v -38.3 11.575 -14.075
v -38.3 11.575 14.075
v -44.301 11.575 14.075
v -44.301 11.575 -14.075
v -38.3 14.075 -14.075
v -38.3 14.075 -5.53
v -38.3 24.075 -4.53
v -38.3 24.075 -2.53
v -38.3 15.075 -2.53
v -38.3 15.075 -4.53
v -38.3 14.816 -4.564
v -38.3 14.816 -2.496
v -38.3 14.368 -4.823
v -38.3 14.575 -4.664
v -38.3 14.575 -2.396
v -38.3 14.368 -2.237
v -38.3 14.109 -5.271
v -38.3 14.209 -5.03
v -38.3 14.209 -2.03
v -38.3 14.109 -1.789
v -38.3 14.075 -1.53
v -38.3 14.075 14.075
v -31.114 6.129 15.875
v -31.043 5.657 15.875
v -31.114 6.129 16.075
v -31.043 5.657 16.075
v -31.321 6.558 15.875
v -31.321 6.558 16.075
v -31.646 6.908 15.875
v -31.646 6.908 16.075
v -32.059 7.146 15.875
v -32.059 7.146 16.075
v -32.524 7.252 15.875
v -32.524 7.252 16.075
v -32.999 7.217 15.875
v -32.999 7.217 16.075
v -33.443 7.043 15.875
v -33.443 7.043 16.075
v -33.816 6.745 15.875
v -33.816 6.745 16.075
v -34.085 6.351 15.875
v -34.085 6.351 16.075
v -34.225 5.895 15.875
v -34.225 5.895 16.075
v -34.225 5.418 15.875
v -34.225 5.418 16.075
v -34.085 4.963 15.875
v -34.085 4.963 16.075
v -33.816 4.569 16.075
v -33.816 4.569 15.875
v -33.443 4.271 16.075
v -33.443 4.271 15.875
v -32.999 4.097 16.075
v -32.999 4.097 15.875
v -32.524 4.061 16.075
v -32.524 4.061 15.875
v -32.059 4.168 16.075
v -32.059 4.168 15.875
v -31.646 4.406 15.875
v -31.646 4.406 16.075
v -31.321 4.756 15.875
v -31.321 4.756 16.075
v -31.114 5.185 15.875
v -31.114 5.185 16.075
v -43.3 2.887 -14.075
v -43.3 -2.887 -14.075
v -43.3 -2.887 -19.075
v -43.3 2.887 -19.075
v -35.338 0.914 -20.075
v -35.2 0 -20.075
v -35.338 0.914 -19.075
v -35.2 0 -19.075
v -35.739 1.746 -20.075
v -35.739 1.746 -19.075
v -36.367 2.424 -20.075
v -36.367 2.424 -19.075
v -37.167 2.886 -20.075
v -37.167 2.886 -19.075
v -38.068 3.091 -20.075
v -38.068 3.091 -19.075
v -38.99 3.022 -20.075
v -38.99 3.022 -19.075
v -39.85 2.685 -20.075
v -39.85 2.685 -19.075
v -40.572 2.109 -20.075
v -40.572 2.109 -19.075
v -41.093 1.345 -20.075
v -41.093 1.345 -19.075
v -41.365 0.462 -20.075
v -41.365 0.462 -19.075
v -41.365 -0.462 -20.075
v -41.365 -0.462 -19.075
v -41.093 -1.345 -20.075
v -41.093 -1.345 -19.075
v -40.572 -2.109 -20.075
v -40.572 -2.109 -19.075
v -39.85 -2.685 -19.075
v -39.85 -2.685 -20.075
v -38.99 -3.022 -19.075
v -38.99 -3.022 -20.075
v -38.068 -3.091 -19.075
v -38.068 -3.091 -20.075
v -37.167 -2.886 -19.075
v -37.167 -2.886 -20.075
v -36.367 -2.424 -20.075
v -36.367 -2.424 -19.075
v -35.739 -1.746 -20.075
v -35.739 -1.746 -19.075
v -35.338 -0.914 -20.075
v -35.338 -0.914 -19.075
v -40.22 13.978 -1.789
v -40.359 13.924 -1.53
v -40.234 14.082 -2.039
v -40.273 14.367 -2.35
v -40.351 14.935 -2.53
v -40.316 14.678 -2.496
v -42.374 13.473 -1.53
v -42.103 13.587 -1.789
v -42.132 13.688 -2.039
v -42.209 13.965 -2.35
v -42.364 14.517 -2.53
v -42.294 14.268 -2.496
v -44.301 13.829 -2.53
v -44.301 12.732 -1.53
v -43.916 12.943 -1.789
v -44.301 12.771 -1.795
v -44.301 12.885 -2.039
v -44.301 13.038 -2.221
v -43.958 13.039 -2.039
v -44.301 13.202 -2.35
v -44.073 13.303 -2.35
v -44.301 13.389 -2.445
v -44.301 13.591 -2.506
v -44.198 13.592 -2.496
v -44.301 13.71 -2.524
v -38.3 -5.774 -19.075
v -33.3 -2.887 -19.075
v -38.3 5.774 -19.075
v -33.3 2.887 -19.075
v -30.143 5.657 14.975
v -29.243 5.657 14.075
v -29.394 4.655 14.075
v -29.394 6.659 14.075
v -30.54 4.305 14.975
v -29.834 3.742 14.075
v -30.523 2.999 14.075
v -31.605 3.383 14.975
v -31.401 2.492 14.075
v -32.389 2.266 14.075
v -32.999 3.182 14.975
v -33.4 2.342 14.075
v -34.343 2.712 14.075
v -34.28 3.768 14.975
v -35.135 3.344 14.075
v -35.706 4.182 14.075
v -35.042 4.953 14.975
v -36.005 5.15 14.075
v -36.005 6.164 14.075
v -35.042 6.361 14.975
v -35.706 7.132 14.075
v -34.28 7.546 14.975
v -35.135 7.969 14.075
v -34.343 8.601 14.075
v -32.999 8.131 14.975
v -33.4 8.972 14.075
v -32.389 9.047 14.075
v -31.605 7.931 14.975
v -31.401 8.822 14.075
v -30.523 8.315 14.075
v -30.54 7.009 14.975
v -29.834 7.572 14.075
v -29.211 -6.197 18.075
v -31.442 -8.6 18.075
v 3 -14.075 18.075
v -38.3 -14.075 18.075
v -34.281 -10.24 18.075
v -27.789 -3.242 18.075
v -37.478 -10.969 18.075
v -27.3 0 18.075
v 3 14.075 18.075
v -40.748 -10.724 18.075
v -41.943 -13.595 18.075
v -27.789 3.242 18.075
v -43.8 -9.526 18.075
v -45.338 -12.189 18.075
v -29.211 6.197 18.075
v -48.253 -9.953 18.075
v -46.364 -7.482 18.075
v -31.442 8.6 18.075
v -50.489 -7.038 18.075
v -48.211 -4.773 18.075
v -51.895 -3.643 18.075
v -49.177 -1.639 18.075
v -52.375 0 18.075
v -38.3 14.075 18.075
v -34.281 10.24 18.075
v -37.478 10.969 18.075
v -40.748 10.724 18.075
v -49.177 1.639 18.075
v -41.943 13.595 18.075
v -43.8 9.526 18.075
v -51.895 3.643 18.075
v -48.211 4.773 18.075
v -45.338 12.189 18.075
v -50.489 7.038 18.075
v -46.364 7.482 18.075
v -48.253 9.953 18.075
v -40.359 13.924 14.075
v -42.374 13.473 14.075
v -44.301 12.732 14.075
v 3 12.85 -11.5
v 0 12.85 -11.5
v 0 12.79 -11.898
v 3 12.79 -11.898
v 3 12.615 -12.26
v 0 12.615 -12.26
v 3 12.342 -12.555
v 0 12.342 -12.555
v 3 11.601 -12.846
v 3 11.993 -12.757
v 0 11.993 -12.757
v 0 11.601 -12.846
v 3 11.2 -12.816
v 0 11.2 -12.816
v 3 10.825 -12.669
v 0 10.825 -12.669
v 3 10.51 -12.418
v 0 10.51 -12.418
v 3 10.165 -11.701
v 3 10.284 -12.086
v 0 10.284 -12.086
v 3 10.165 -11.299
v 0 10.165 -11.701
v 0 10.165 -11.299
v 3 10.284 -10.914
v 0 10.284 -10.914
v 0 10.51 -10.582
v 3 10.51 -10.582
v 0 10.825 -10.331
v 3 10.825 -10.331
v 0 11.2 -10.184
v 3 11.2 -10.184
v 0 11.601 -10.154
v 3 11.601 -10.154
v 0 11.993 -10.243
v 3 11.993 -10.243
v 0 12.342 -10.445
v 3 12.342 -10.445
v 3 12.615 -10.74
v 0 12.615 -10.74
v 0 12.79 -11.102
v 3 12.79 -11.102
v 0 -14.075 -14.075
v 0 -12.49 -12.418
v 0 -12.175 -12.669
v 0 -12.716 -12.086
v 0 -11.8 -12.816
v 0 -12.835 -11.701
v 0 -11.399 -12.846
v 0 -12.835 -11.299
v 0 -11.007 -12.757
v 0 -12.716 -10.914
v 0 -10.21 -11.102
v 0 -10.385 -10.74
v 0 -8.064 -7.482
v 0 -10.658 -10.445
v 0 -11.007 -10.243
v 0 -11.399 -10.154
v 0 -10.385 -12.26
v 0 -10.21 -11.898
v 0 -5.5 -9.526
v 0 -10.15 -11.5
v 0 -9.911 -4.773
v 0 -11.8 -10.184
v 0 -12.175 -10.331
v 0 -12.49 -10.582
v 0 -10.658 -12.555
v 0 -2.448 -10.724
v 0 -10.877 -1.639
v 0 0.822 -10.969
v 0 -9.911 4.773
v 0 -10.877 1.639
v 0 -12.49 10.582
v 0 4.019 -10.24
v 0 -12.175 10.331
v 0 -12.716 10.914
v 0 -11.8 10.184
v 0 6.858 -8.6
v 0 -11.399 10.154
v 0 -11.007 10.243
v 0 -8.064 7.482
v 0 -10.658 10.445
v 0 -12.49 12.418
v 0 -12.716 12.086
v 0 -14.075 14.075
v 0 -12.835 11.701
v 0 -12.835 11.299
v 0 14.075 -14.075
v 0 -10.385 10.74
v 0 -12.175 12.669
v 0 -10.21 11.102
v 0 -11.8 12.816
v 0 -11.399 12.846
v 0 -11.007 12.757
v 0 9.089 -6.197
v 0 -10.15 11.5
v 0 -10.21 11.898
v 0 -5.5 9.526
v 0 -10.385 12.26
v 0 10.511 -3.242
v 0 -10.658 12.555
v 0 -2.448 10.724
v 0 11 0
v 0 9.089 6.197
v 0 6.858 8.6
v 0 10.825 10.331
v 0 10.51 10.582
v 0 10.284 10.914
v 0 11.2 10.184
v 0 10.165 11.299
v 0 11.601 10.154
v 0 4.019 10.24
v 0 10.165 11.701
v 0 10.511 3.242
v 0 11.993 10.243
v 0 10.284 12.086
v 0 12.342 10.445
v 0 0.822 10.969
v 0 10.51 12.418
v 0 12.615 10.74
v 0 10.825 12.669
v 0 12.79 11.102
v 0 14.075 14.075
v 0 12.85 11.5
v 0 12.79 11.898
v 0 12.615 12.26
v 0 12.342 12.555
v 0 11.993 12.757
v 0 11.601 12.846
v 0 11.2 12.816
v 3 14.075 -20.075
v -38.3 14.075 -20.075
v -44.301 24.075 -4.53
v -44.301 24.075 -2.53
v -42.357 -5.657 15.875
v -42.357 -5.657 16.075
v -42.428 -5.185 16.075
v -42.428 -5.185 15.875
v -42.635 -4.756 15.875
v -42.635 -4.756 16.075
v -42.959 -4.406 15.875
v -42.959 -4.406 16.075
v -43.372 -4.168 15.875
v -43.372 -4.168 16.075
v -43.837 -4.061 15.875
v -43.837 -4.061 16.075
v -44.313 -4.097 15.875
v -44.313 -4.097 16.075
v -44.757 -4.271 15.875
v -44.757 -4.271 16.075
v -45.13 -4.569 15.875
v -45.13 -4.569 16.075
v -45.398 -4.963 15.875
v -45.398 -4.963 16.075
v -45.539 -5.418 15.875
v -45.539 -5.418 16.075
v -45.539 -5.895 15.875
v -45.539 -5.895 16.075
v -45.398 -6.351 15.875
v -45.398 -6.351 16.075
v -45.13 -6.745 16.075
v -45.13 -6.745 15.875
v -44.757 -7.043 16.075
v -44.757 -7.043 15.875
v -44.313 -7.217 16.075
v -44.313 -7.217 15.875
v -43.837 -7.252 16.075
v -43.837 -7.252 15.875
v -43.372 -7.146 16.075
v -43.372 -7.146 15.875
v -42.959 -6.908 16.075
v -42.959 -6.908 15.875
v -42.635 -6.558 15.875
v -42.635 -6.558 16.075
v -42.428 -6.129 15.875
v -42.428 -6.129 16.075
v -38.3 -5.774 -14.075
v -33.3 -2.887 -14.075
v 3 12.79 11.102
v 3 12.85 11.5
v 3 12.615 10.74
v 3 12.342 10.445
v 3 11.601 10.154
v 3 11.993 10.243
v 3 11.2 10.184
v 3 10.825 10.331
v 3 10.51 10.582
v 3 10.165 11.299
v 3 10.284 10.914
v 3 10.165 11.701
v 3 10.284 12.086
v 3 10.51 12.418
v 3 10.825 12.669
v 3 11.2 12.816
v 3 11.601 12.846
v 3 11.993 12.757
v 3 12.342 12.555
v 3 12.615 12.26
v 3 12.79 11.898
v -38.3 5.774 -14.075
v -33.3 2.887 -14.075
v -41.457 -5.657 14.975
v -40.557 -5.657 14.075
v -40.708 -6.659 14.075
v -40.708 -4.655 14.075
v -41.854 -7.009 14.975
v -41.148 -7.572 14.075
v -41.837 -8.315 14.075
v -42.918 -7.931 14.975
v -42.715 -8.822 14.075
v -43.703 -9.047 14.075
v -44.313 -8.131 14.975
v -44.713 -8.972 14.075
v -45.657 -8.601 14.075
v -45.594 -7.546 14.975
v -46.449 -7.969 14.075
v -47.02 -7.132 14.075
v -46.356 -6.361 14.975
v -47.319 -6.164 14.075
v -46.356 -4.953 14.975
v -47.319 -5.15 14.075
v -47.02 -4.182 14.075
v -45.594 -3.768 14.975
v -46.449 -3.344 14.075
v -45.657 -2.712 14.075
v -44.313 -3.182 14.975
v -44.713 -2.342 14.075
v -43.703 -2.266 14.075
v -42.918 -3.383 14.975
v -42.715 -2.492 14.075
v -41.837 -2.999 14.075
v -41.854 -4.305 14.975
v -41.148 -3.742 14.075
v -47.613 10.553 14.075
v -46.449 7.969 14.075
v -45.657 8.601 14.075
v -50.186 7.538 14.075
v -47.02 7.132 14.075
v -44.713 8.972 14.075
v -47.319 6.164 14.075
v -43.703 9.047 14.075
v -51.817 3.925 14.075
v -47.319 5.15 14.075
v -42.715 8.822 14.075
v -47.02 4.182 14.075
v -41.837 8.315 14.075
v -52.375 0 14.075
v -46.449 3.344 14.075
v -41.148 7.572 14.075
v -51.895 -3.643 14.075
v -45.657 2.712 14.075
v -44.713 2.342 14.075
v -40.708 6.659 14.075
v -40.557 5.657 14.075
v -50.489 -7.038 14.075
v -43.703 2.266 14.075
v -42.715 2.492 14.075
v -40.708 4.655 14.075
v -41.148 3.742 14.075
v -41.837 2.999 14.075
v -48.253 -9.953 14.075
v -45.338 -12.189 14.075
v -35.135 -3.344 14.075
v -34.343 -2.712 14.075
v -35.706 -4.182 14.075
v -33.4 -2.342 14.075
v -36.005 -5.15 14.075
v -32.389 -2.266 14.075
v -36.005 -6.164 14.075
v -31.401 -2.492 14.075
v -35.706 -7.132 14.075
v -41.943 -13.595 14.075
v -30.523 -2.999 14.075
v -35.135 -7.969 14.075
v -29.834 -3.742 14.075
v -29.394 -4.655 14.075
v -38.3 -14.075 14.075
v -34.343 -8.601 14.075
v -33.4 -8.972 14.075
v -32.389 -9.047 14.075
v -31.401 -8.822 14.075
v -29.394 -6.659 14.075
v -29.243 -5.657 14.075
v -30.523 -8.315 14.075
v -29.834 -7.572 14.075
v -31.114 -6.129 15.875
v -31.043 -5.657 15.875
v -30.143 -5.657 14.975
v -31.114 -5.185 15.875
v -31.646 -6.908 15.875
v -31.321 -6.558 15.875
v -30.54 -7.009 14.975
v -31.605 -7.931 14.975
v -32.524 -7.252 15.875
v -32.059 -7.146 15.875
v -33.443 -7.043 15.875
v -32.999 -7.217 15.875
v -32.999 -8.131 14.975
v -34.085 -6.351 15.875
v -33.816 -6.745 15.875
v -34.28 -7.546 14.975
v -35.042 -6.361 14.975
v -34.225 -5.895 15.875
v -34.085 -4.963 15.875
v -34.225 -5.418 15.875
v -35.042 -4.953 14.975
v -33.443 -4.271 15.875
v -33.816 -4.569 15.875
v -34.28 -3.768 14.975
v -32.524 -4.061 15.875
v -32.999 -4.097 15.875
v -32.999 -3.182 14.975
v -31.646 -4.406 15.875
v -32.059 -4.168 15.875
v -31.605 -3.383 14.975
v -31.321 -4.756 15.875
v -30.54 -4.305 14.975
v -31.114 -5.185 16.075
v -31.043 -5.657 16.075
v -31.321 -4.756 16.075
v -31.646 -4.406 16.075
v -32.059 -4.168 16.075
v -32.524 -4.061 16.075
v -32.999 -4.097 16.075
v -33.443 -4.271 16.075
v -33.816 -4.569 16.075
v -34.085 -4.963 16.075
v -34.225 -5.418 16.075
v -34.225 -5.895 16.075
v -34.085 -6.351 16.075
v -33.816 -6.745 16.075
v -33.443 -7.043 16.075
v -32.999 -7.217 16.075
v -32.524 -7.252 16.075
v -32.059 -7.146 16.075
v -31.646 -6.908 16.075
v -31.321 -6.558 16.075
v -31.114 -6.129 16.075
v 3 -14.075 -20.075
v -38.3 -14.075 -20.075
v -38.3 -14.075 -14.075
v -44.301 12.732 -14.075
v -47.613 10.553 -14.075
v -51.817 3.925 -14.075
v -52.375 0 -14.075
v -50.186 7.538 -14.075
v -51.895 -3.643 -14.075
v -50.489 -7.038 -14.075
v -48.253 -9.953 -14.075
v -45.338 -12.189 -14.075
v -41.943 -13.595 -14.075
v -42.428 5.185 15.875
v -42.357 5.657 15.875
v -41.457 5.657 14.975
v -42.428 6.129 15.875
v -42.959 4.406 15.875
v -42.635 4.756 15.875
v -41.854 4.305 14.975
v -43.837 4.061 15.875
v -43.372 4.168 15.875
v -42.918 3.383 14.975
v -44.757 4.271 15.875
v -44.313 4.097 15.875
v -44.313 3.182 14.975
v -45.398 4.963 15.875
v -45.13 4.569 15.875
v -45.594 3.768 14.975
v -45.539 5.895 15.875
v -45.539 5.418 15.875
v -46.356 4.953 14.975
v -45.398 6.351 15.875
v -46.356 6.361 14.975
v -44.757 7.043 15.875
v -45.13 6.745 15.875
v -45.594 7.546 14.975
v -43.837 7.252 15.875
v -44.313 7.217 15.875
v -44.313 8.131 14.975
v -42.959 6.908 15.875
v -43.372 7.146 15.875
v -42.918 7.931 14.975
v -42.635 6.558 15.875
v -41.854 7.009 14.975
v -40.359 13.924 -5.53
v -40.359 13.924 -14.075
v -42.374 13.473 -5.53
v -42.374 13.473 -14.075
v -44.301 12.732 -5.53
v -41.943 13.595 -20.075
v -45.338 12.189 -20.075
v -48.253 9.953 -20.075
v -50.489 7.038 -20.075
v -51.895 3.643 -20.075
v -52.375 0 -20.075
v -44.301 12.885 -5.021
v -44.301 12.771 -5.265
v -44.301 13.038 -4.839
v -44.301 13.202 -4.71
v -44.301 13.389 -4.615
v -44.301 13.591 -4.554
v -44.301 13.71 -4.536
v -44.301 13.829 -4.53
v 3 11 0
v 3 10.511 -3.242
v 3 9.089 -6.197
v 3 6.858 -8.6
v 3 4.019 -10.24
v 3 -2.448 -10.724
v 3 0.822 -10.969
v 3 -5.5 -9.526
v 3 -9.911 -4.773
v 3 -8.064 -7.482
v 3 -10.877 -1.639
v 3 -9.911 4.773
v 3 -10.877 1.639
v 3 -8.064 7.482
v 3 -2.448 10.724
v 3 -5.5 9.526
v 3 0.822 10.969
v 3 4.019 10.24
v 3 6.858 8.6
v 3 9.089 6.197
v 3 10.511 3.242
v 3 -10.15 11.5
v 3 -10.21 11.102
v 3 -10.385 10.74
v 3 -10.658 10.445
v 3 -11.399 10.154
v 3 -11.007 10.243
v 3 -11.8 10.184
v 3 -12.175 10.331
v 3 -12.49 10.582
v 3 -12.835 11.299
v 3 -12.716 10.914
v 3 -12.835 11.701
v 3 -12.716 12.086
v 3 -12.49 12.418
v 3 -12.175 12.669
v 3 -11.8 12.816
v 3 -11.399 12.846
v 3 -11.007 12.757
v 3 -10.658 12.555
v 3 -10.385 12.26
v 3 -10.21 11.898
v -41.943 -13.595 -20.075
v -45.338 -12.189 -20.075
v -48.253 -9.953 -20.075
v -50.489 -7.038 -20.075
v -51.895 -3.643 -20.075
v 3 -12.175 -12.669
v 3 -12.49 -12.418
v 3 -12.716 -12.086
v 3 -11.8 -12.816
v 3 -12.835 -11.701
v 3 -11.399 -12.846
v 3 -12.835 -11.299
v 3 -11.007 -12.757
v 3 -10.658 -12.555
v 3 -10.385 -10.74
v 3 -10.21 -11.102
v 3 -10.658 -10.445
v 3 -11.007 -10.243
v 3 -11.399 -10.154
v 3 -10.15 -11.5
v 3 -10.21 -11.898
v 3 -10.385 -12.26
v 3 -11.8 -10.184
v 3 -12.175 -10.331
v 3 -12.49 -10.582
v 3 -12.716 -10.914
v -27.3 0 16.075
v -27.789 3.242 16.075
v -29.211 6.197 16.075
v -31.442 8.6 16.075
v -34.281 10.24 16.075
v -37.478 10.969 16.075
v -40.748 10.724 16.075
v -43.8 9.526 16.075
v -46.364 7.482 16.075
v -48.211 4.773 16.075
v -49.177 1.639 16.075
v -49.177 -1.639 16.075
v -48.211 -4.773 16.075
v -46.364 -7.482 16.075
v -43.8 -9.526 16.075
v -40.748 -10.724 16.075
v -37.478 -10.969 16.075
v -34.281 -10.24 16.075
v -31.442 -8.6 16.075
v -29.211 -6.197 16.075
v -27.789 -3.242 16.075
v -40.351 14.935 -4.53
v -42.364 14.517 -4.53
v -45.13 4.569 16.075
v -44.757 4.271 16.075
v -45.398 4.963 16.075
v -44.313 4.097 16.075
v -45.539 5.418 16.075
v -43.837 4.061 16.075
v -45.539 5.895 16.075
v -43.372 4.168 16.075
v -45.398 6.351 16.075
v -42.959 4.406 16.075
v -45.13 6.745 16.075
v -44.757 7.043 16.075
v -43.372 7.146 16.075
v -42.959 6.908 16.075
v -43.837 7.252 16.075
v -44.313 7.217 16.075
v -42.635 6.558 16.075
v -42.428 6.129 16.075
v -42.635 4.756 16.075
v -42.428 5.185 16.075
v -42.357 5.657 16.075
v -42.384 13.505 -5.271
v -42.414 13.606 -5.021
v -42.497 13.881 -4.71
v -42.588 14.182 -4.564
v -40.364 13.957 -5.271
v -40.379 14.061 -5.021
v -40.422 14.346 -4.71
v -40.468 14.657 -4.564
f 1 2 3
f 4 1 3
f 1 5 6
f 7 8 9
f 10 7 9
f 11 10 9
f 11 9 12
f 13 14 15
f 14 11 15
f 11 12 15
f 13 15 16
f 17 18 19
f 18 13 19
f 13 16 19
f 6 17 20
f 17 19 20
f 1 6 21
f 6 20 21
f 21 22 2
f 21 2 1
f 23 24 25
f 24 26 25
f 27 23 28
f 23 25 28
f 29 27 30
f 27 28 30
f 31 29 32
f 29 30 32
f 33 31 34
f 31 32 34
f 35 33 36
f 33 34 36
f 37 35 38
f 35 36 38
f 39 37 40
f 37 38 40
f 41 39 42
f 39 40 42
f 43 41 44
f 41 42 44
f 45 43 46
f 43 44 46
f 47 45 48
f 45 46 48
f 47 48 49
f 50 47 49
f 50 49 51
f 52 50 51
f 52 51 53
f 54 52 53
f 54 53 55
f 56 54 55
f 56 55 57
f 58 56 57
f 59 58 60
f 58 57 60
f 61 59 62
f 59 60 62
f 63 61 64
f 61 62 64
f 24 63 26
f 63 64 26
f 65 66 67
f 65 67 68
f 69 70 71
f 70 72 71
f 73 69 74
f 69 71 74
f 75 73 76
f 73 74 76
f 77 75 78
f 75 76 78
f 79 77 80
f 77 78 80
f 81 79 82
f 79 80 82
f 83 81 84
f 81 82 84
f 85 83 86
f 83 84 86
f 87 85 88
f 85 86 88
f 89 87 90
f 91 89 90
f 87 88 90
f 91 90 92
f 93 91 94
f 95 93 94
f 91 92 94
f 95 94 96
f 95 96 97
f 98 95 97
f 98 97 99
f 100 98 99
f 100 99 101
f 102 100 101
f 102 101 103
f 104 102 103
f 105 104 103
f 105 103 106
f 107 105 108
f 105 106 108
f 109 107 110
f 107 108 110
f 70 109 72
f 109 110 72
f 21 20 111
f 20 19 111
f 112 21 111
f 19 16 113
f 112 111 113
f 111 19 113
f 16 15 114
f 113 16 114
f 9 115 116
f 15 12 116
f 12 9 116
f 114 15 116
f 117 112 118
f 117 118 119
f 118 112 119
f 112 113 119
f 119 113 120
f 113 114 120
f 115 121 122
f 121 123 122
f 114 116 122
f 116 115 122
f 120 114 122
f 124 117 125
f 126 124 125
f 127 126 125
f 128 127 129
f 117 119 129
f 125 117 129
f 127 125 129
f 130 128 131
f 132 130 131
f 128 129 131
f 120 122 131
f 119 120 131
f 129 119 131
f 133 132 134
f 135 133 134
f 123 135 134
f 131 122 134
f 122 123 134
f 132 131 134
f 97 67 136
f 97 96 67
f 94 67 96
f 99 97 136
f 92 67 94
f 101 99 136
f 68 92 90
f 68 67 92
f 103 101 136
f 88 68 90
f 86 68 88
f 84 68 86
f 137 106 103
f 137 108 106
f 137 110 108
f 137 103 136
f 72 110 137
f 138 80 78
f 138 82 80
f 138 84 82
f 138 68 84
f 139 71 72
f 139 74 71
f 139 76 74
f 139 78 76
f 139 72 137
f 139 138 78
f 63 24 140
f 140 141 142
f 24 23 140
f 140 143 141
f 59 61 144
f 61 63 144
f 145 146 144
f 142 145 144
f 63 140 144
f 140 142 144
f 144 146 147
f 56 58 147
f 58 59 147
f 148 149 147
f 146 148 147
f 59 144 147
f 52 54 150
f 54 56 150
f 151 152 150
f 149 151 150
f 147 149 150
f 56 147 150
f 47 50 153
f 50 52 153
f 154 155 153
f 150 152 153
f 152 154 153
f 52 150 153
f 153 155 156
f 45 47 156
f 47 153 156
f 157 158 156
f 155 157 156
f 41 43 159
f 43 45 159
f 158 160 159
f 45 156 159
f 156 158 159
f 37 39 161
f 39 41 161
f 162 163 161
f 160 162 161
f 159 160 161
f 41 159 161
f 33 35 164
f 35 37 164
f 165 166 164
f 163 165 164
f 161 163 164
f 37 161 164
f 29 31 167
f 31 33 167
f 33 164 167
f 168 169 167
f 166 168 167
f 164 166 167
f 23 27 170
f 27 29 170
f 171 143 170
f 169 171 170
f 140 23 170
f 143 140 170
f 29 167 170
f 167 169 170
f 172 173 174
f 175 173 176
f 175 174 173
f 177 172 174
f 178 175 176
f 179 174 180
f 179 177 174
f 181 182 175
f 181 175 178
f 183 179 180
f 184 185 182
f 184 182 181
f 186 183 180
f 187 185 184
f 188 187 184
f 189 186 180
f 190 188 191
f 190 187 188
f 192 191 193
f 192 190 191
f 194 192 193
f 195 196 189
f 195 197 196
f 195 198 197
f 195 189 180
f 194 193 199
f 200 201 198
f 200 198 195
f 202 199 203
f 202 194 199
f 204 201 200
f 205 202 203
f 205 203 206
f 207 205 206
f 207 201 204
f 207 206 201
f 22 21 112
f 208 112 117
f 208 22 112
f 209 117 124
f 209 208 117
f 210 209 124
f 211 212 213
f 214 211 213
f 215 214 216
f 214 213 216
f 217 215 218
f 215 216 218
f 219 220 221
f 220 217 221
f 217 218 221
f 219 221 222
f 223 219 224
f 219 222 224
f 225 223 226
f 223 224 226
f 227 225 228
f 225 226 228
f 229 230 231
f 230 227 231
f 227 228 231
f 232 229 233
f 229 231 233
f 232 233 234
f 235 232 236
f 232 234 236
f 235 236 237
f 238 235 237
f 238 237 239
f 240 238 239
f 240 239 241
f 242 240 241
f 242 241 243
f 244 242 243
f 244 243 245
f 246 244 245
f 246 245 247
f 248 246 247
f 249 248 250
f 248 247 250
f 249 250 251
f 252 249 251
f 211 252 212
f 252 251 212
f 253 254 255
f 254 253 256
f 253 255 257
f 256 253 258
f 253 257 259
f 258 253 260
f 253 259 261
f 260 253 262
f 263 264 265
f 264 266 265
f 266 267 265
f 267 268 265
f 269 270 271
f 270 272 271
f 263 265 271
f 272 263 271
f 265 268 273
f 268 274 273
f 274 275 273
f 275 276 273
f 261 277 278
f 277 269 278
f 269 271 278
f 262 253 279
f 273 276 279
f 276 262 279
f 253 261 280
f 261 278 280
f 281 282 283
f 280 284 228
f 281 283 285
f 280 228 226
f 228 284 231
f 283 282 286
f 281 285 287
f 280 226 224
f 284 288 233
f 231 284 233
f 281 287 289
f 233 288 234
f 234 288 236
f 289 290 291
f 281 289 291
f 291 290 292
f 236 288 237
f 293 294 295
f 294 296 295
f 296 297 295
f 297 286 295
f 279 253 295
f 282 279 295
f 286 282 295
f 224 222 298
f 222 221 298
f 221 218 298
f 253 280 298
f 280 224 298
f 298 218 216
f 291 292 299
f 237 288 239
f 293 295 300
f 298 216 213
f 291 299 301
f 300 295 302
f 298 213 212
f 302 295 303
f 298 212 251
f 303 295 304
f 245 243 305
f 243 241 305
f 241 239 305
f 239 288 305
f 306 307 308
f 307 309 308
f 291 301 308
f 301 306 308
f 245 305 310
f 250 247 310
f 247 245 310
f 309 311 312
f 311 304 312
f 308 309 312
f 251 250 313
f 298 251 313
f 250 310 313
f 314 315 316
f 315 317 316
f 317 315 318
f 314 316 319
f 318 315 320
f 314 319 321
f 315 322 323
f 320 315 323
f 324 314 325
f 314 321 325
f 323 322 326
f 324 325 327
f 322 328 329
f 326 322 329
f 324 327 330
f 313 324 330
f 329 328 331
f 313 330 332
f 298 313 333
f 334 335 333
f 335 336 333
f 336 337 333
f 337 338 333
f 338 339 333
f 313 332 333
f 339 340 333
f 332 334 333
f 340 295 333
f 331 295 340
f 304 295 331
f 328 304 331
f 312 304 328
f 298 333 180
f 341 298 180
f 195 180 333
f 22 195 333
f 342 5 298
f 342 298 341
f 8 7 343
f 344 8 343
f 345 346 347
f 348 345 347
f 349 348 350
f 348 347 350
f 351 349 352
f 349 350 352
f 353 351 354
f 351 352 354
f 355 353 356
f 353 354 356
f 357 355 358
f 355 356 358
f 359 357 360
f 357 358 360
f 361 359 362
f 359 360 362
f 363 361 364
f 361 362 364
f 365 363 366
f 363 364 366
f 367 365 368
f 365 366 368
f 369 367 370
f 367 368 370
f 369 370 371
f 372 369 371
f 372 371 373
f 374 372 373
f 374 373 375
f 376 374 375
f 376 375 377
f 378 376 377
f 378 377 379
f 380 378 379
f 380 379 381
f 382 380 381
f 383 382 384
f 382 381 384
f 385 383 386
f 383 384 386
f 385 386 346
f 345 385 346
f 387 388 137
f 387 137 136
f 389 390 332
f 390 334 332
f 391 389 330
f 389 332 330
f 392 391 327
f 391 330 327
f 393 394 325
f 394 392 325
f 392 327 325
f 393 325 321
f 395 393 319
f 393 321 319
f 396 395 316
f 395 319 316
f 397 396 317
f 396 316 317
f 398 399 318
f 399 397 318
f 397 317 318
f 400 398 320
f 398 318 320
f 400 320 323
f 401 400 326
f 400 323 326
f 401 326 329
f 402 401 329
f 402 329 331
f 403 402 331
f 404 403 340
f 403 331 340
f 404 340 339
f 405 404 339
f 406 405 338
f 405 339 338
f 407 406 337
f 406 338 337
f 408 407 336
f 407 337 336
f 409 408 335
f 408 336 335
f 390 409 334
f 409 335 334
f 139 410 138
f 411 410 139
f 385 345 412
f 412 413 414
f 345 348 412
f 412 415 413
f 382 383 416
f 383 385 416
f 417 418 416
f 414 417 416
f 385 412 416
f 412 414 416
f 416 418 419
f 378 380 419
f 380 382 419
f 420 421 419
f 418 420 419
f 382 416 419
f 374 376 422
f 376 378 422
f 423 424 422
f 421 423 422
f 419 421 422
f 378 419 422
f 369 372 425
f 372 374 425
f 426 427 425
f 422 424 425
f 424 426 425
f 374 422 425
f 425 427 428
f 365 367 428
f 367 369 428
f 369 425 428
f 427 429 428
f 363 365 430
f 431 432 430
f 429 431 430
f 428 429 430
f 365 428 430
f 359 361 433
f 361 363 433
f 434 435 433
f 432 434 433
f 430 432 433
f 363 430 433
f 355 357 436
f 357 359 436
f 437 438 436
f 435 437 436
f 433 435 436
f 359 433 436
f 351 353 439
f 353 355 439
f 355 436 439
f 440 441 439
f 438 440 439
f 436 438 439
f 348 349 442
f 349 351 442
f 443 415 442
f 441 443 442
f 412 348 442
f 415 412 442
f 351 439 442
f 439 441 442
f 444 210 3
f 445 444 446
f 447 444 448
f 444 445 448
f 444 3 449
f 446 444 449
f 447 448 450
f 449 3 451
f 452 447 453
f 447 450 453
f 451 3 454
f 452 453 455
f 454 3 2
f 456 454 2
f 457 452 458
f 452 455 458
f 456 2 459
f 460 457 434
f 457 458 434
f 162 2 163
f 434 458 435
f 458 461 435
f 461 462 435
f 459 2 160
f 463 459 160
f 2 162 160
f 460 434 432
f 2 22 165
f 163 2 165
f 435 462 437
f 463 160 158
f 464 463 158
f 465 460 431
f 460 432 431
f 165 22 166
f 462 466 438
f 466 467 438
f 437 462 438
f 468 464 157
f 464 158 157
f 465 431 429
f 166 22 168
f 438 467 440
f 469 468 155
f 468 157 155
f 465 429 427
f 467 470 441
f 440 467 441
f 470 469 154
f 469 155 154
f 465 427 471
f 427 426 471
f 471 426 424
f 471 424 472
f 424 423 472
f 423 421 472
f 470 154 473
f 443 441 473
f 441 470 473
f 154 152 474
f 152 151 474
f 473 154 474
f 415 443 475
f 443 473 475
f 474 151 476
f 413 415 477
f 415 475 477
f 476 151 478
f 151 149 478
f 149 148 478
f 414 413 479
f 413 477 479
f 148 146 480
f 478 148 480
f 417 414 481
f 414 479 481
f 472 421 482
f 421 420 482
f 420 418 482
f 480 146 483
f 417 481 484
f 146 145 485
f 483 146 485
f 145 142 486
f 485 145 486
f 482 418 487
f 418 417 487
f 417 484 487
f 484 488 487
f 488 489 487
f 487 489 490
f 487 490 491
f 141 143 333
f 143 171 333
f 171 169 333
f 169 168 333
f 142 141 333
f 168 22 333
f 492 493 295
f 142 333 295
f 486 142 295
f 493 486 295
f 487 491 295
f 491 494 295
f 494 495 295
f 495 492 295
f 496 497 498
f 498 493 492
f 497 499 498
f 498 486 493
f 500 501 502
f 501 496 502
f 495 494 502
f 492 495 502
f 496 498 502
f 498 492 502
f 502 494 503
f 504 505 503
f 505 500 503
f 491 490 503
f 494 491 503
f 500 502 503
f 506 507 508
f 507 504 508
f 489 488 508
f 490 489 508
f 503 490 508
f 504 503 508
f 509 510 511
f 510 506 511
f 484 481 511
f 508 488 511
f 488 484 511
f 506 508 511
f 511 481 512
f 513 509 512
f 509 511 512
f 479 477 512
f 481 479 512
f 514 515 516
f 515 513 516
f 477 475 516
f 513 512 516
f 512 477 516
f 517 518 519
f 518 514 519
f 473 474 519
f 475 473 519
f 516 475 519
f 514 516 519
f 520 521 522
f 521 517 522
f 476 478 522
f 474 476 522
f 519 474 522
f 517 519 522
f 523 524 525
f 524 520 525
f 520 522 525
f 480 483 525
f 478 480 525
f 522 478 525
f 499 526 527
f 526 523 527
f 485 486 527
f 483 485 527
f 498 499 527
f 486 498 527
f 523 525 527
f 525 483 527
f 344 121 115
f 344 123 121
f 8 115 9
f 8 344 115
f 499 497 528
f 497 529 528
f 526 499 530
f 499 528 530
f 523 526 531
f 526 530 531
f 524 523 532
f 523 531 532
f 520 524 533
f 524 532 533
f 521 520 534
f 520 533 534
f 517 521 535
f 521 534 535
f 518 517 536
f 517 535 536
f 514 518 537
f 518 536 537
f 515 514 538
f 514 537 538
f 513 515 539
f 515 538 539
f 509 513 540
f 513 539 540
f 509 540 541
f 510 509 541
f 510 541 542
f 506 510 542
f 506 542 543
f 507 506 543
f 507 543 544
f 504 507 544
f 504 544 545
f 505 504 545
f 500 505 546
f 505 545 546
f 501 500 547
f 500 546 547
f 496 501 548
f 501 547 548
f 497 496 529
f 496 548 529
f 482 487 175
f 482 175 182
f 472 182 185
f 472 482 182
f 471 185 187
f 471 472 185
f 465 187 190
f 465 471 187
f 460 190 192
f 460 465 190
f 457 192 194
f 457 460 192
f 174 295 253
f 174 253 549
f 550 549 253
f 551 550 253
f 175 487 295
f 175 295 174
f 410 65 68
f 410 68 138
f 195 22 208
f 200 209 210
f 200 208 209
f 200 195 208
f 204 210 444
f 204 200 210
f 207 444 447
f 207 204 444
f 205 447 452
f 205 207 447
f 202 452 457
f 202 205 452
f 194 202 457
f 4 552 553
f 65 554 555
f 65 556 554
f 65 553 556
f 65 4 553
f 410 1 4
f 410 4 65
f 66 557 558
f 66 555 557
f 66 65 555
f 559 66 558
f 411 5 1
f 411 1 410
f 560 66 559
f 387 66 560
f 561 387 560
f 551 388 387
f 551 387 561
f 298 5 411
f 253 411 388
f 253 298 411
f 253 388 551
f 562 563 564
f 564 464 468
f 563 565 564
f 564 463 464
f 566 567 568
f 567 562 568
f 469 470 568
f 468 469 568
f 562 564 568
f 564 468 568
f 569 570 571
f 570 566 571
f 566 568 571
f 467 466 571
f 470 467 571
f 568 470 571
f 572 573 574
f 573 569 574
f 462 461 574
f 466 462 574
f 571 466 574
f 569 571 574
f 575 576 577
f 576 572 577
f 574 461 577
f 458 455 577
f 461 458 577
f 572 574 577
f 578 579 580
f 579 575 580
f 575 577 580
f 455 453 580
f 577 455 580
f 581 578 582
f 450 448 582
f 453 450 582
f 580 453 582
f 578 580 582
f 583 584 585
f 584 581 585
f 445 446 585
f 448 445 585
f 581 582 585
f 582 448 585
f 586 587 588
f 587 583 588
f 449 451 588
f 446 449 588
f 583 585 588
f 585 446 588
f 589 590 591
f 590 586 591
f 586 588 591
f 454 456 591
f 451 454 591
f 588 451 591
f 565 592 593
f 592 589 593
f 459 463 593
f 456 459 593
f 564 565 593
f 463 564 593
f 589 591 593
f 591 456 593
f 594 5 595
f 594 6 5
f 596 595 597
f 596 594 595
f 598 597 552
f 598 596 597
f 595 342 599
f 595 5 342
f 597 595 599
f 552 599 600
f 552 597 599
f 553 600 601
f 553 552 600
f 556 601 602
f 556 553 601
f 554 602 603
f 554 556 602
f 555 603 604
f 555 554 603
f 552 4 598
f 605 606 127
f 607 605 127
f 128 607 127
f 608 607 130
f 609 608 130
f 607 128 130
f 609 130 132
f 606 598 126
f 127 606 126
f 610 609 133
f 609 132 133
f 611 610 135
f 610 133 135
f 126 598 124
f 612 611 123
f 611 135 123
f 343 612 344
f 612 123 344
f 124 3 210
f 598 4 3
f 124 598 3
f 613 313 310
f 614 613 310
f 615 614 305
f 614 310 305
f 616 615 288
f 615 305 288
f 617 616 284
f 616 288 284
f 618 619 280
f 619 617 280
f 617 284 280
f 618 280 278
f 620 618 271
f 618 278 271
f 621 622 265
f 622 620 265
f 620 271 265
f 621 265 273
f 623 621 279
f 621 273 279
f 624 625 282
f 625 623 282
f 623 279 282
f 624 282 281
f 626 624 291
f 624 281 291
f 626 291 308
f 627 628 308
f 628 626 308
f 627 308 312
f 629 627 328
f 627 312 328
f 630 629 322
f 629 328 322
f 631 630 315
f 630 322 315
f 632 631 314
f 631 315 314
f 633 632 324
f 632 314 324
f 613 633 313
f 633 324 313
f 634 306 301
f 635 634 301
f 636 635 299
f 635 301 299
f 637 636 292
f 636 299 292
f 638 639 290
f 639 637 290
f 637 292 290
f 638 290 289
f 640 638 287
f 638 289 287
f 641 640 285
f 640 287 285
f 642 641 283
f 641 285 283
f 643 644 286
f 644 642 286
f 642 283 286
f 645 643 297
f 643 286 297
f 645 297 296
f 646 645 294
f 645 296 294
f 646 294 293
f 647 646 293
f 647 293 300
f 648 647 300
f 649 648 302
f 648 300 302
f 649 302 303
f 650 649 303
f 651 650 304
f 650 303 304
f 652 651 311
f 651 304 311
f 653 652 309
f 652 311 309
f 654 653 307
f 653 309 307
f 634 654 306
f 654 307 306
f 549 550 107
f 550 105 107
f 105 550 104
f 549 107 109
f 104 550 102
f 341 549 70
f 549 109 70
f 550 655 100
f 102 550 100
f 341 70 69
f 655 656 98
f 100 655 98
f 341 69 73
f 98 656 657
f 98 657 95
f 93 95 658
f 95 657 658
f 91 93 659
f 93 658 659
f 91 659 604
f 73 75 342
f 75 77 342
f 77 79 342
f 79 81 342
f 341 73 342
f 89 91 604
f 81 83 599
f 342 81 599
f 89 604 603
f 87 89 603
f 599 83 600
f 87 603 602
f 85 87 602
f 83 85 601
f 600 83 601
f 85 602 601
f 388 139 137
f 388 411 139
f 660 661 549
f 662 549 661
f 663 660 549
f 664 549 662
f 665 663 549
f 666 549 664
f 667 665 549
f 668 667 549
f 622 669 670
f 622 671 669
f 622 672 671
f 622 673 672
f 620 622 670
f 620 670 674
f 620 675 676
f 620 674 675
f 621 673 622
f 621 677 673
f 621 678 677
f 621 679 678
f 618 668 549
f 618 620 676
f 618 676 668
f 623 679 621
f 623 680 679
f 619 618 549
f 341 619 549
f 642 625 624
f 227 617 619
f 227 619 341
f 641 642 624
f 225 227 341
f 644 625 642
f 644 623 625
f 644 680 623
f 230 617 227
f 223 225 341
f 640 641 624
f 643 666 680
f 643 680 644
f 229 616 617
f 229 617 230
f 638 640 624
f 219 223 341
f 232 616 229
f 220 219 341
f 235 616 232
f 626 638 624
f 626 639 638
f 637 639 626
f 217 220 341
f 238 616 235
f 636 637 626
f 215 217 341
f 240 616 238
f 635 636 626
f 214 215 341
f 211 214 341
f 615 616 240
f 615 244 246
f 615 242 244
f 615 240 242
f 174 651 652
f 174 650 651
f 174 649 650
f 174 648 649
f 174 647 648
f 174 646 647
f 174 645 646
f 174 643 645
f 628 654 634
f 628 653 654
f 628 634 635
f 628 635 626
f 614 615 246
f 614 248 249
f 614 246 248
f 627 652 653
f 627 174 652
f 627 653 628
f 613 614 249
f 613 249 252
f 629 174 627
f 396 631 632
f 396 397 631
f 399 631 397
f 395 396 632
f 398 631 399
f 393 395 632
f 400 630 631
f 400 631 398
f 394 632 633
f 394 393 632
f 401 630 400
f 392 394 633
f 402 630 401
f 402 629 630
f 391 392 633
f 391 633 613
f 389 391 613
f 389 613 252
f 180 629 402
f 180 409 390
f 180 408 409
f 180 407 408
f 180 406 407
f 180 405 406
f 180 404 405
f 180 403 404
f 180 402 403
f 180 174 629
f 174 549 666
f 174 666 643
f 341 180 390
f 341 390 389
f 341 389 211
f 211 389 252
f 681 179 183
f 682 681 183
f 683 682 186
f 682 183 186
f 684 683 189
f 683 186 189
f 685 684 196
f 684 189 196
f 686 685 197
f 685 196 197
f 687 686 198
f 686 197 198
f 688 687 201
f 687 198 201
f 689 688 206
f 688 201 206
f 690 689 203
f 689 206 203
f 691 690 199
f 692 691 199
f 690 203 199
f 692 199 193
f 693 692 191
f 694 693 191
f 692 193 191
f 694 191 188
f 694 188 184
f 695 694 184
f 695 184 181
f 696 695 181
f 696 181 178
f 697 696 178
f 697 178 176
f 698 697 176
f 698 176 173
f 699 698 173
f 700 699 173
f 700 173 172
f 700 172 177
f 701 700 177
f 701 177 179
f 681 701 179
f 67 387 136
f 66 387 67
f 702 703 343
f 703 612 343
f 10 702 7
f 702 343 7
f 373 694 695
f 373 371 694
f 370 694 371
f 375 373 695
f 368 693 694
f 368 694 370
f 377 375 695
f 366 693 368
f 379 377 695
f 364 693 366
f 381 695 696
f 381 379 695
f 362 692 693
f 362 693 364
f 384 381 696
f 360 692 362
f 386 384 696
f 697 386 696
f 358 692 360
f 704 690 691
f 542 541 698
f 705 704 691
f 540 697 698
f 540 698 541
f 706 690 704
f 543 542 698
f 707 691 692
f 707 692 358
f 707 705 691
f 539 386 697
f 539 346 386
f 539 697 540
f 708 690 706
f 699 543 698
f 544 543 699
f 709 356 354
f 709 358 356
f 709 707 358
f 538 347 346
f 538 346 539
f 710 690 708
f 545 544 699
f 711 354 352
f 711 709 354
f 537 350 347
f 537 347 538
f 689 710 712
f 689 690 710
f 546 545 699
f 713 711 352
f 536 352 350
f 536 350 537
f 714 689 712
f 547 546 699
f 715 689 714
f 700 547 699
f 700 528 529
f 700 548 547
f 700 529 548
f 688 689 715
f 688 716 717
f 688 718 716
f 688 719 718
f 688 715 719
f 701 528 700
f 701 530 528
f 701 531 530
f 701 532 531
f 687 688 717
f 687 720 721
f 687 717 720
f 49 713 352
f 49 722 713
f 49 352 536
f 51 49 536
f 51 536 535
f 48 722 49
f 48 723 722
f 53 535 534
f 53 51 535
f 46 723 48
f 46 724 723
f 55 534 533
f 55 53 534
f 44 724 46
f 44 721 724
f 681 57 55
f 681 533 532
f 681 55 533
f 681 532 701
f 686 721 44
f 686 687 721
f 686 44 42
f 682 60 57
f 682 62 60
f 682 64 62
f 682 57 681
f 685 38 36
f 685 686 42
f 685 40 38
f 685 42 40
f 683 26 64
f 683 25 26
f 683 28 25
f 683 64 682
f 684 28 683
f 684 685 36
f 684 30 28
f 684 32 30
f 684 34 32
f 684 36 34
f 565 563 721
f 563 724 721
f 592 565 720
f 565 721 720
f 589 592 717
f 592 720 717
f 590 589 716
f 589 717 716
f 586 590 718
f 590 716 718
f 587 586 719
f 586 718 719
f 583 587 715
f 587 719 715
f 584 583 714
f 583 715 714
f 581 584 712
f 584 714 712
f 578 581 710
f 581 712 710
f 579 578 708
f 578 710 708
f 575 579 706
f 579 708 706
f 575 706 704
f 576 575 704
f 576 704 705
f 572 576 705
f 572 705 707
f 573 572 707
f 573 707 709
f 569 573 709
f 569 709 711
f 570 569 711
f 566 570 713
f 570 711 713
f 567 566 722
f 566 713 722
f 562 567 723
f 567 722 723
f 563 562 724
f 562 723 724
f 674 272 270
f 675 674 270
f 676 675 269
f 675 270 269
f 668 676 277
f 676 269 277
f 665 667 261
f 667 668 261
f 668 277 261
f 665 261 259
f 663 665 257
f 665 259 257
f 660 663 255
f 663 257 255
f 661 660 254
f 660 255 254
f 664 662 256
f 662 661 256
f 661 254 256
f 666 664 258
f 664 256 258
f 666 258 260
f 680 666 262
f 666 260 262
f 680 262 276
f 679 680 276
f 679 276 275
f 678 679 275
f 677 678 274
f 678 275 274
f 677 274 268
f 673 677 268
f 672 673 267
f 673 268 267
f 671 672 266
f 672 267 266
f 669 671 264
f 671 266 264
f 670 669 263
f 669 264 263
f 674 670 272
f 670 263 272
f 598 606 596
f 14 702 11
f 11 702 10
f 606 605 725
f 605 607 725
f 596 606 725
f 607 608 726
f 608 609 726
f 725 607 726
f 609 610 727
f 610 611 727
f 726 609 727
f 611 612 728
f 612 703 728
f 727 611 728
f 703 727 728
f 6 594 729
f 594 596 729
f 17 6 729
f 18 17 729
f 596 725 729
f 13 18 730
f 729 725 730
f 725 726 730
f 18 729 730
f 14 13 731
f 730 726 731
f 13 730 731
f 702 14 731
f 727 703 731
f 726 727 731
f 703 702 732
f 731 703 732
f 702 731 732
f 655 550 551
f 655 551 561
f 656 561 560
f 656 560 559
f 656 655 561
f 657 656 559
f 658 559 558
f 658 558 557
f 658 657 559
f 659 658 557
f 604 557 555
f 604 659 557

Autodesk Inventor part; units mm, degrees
ref_plane "YZ Plane" through (0, 0, 0) normal (1, 0, 0) x (0, 1, 0)
ref_plane "XZ Plane" through (0, 0, 0) normal (0, 1, 0) x (-1, 0, 0)
sketch "草圖1" plane through (0, 0, 0) normal (1, 0, 0) x (0, 1, 0)
  line L0 (-14.075, 14.075) -> (14.075, 14.075)
  line L1 (14.075, 14.075) -> (14.075, -14.075)
  line L2 (14.075, -14.075) -> (-14.075, -14.075)
  line L3 (-14.075, -14.075) -> (-14.075, 14.075)
  line L4 (-14.075, 14.075) -> (14.075, -14.075) construction
  line L5 (14.075, 14.075) -> (-14.075, -14.075) construction
  line L6 (14.075, 14.075) -> (-14.075, 14.075)
  line L7 (-14.075, 14.075) -> (-14.075, 18.075)
  line L8 (-14.075, 18.075) -> (14.075, 18.075)
  line L9 (14.075, 18.075) -> (14.075, 14.075)
  circle A0 centre (0, 0) radius 11
  line L10 (-11.5, 11.5) -> (11.5, 11.5) construction
  line L11 (11.5, 11.5) -> (11.5, -11.5) construction
  line L12 (11.5, -11.5) -> (-11.5, -11.5) construction
  line L13 (-11.5, -11.5) -> (-11.5, 11.5) construction
  line L14 (-11.5, 11.5) -> (11.5, -11.5) construction
  line L15 (11.5, 11.5) -> (-11.5, -11.5) construction
  circle A1 centre (11.5, 11.5) radius 1.35
  circle A2 centre (-11.5, 11.5) radius 1.35
  circle A3 centre (-11.5, -11.5) radius 1.35
  circle A4 centre (11.5, -11.5) radius 1.35
  line L16 (14.075, -14.075) -> (-14.075, -14.075)
  line L17 (-14.075, -14.075) -> (-14.075, -20.075)
  line L18 (-14.075, -20.075) -> (14.075, -20.075)
  line L19 (14.075, -20.075) -> (14.075, -14.075)
  dimension "d0" = 28.15
  dimension "d1" = 28.15
  dimension "d2" = 4
  dimension "d3" = 22
  dimension "d4" = 23
  dimension "d5" = 23
  dimension "d6" = 2.7
  dimension "d9" = 360
  dimension "d11" = 6
extrude "擠出1" add sketch "草圖1" along normal blind 3
sketch "草圖2" plane through (0, 0, 0) normal (-1, 0, 0) x (0, 0, 1)
  line L0 (18.075, 14.075) -> (18.075, -14.075) projected
  line L1 (-20.075, 14.075) -> (18.075, 14.075) projected
  line L2 (-20.075, -14.075) -> (-20.075, 14.075) projected
  line L3 (18.075, -14.075) -> (-20.075, -14.075) projected
  circle A0 centre (0, 0) radius 11 projected
  circle A1 centre (11.5, 11.5) radius 1.35 projected
  circle A2 centre (11.5, -11.5) radius 1.35 projected
  circle A3 centre (-11.5, -11.5) radius 1.35 projected
  circle A4 centre (-11.5, 11.5) radius 1.35 projected
  line L4 (-14.075, 14.075) -> (-14.075, -14.075)
  line L5 (14.075, 14.075) -> (14.075, -14.075)
  dimension "d14" = 6
  dimension "d15" = 4
extrude "擠出2" add sketch "草圖2" along normal blind 52.375 contours L0 L3 L5 L1 | L4 L3 L2 L1
sketch "草圖3" plane through (3, -14.075, 18.075) normal (0, 0, 1) x (1, 0, 0)
  line L0 (-55.375, 0) -> (0, 0) projected
  line L1 (0, 28.15) -> (0, 0) projected
  line L2 (0, 28.15) -> (-55.375, 28.15) projected
  line L3 (-55.375, 0) -> (-55.375, 28.15) projected
  circle A0 centre (-41.3, 14.075) radius 11
  line L4 (-55.375, 0) -> (-55.375, 28.15) projected
  circle A1 centre (-41.3, 14.075) radius 8 construction
  line L5 (-41.3, 14.075) -> (-33.5218, 21.8532) construction
  line L6 (-41.3, 14.075) -> (-30.3, 14.075) construction
  circle A2 centre (-35.6431, 19.7319) radius 1.6
  circle A3 centre (-46.9569, 19.7319) radius 1.6
  circle A4 centre (-46.9569, 8.4181) radius 1.6
  circle A5 centre (-35.6431, 8.4181) radius 1.6
  point P0 (-3, 14.075)
  dimension "d18" = 22
  dimension "d19" = 16
  dimension "d65" = 10
  dimension "d20" = 45
  dimension "d21" = 3.2
  dimension "d24" = 360
  dimension "d30" = 14.075
  dimension "d31" = 14.075
extrude "擠出3" cut sketch "草圖3" against normal up to surface (4 mm away) contours A2 | A3 | A4 | A5
extrude "擠出4" cut sketch "草圖3" against normal blind 2 contours A0
fillet "圓角1" radius 14.075 4 edges at (-52.375, 14.075, 16.075) (-52.375, 14.075, -17.075) (-52.375, -14.075, 16.075) (-52.375, -14.075, -17.075)
sketch "草圖4" plane through (0, -14.075, -14.075) normal (0, 0, 1) x (1, 0, 0)
  circle A0 centre (-38.3, 14.075) radius 11 projected
  line L0 (-38.3, 8.3015) -> (-43.3, 11.1882)
  line L1 (-43.3, 11.1882) -> (-43.3, 16.9618)
  line L2 (-43.3, 16.9618) -> (-38.3, 19.8485)
  line L3 (-38.3, 19.8485) -> (-33.3, 16.9618)
  line L4 (-33.3, 16.9618) -> (-33.3, 11.1882)
  line L5 (-33.3, 11.1882) -> (-38.3, 8.3015)
  point P0 (0, 14.075)
  dimension "d33" = 10
extrude "擠出5" cut sketch "草圖4" against normal blind 5 contours L0 L1 L2 L3 L4 L5
sketch "草圖5" plane through (0, -14.075, -19.075) normal (0, 0, 1) x (1, 0, 0)
  circle A0 centre (-38.3, 14.075) radius 11 projected
  circle A1 centre (-38.3, 14.075) radius 3.1
  point P0 (0, 14.075)
  dimension "d36" = 6.2
extrude "擠出6" cut sketch "草圖5" against normal up to surface (1 mm away) contours A1
sketch "草圖7" plane through (3, 0, 0) normal (1, 0, 0) x (0, 0, -1)
  line L0 (-18.075, 14.075) -> (-18.075, -14.075) projected
  line L1 (-18.075, -14.075) -> (20.075, -14.075) projected
  line L2 (20.075, -14.075) -> (20.075, 14.075) projected
  line L3 (20.075, 14.075) -> (-18.075, 14.075) projected
  circle A0 centre (0, 0) radius 11 projected
  circle A1 centre (-11.5, 11.5) radius 1.35 projected
  circle A2 centre (-11.5, -11.5) radius 1.35 projected
  circle A3 centre (11.5, -11.5) radius 1.35 projected
  circle A4 centre (11.5, 11.5) radius 1.35 projected
  line L4 (-2.75, 14.075) -> (-2.75, 10.6507)
  line L5 (2.75, 14.075) -> (2.75, 10.6507)
  dimension "d44" = 5.5
  dimension "d45" = 2.75
chamfer "倒角1" distance 1.8 angle 45 4 edges at (-45.5569, -5.6569, 14.075) (-45.5569, 5.6569, 14.075) (-34.2431, -5.6569, 14.075) (-34.2431, 5.6569, 14.075)
sketch "草圖11" plane through (3, -14.075, 18.075) normal (0, 0, 1) x (1, 0, 0)
  line L0 (-37.3248, 33.6873) -> (-37.3375, 43.4872) projected
  line L1 (-37.3248, 33.6873) -> (-31.2248, 33.6951) projected
  line L2 (-31.2375, 43.4951) -> (-31.2248, 33.6951) projected
  line L3 (-37.3375, 43.4872) -> (-31.2375, 43.4951) projected
  arc A0 (-41.3, 28.15) -> (-41.3, 0) centre (-41.3, 14.075) ccw projected
  line L4 (-41.3, 0) -> (0, 0) projected
  line L5 (0, 28.15) -> (0, 0) projected
  line L6 (0, 28.15) -> (-41.3, 28.15) projected
  circle A1 centre (-41.3, 14.075) radius 11 projected
  line L7 (-31.2003, 28.15) -> (-31.2003, 25.65)
  line L8 (-31.2003, 25.65) -> (-47.301, 25.65)
  line L9 (-47.301, 25.65) -> (-47.301, 26.8066)
  line L10 (-41.3, 28.15) -> (-41.3, 25.65)
  point P0 (-3, 14.075)
  dimension "d64" = 2.5
extrude "擠出12" add sketch "草圖11" against normal up to surface (38.15 mm away) contours L10 L8 L9 A0
ref_plane "工作平面4" through (3, -14.075, -3.53) normal (0, 0, 1) x (1, 0, 0)
sketch "草圖15" plane through (3, -14.075, -3.53) normal (0, 0, 1) x (1, 0, 0)
  line L0 (0, 28.15) -> (-41.3, 28.15) projected
  arc A0 (-41.3, 28.15) -> (-41.3, 0) centre (-41.3, 14.075) ccw projected
  line L1 (-47.3274, 33.6866) -> (-47.3385, 41.6466) construction
  line L2 (-47.3274, 33.6866) -> (-41.2274, 33.6951) construction
  line L3 (-41.2385, 41.6551) -> (-41.2274, 33.6951) construction
  line L4 (-47.3385, 41.6466) -> (-41.2385, 41.6551) construction
  line L5 (-41.3, 38.15) -> (-47.301, 38.15)
  line L6 (-41.3, 38.15) -> (-41.3, 28.15)
  line L7 (-47.301, 38.15) -> (-47.301, 26.8066)
  point P0 (-3, 14.075)
  point P1 (-47.301, 26.8066)
  dimension "d78" = 10
extrude "擠出16" add sketch "草圖15" along normal mid plane 2
fillet "圓角5" radius 1 2 edges at (-41.3748, 13.735, -4.53) (-41.3748, 13.735, -2.53)
equation "\"d31\" = d30"
equation "\"d26\" = d19"
equation "\"d45\" = 0.5 * d44"
properties part number "j6 motor mount v2_3D 列印"
